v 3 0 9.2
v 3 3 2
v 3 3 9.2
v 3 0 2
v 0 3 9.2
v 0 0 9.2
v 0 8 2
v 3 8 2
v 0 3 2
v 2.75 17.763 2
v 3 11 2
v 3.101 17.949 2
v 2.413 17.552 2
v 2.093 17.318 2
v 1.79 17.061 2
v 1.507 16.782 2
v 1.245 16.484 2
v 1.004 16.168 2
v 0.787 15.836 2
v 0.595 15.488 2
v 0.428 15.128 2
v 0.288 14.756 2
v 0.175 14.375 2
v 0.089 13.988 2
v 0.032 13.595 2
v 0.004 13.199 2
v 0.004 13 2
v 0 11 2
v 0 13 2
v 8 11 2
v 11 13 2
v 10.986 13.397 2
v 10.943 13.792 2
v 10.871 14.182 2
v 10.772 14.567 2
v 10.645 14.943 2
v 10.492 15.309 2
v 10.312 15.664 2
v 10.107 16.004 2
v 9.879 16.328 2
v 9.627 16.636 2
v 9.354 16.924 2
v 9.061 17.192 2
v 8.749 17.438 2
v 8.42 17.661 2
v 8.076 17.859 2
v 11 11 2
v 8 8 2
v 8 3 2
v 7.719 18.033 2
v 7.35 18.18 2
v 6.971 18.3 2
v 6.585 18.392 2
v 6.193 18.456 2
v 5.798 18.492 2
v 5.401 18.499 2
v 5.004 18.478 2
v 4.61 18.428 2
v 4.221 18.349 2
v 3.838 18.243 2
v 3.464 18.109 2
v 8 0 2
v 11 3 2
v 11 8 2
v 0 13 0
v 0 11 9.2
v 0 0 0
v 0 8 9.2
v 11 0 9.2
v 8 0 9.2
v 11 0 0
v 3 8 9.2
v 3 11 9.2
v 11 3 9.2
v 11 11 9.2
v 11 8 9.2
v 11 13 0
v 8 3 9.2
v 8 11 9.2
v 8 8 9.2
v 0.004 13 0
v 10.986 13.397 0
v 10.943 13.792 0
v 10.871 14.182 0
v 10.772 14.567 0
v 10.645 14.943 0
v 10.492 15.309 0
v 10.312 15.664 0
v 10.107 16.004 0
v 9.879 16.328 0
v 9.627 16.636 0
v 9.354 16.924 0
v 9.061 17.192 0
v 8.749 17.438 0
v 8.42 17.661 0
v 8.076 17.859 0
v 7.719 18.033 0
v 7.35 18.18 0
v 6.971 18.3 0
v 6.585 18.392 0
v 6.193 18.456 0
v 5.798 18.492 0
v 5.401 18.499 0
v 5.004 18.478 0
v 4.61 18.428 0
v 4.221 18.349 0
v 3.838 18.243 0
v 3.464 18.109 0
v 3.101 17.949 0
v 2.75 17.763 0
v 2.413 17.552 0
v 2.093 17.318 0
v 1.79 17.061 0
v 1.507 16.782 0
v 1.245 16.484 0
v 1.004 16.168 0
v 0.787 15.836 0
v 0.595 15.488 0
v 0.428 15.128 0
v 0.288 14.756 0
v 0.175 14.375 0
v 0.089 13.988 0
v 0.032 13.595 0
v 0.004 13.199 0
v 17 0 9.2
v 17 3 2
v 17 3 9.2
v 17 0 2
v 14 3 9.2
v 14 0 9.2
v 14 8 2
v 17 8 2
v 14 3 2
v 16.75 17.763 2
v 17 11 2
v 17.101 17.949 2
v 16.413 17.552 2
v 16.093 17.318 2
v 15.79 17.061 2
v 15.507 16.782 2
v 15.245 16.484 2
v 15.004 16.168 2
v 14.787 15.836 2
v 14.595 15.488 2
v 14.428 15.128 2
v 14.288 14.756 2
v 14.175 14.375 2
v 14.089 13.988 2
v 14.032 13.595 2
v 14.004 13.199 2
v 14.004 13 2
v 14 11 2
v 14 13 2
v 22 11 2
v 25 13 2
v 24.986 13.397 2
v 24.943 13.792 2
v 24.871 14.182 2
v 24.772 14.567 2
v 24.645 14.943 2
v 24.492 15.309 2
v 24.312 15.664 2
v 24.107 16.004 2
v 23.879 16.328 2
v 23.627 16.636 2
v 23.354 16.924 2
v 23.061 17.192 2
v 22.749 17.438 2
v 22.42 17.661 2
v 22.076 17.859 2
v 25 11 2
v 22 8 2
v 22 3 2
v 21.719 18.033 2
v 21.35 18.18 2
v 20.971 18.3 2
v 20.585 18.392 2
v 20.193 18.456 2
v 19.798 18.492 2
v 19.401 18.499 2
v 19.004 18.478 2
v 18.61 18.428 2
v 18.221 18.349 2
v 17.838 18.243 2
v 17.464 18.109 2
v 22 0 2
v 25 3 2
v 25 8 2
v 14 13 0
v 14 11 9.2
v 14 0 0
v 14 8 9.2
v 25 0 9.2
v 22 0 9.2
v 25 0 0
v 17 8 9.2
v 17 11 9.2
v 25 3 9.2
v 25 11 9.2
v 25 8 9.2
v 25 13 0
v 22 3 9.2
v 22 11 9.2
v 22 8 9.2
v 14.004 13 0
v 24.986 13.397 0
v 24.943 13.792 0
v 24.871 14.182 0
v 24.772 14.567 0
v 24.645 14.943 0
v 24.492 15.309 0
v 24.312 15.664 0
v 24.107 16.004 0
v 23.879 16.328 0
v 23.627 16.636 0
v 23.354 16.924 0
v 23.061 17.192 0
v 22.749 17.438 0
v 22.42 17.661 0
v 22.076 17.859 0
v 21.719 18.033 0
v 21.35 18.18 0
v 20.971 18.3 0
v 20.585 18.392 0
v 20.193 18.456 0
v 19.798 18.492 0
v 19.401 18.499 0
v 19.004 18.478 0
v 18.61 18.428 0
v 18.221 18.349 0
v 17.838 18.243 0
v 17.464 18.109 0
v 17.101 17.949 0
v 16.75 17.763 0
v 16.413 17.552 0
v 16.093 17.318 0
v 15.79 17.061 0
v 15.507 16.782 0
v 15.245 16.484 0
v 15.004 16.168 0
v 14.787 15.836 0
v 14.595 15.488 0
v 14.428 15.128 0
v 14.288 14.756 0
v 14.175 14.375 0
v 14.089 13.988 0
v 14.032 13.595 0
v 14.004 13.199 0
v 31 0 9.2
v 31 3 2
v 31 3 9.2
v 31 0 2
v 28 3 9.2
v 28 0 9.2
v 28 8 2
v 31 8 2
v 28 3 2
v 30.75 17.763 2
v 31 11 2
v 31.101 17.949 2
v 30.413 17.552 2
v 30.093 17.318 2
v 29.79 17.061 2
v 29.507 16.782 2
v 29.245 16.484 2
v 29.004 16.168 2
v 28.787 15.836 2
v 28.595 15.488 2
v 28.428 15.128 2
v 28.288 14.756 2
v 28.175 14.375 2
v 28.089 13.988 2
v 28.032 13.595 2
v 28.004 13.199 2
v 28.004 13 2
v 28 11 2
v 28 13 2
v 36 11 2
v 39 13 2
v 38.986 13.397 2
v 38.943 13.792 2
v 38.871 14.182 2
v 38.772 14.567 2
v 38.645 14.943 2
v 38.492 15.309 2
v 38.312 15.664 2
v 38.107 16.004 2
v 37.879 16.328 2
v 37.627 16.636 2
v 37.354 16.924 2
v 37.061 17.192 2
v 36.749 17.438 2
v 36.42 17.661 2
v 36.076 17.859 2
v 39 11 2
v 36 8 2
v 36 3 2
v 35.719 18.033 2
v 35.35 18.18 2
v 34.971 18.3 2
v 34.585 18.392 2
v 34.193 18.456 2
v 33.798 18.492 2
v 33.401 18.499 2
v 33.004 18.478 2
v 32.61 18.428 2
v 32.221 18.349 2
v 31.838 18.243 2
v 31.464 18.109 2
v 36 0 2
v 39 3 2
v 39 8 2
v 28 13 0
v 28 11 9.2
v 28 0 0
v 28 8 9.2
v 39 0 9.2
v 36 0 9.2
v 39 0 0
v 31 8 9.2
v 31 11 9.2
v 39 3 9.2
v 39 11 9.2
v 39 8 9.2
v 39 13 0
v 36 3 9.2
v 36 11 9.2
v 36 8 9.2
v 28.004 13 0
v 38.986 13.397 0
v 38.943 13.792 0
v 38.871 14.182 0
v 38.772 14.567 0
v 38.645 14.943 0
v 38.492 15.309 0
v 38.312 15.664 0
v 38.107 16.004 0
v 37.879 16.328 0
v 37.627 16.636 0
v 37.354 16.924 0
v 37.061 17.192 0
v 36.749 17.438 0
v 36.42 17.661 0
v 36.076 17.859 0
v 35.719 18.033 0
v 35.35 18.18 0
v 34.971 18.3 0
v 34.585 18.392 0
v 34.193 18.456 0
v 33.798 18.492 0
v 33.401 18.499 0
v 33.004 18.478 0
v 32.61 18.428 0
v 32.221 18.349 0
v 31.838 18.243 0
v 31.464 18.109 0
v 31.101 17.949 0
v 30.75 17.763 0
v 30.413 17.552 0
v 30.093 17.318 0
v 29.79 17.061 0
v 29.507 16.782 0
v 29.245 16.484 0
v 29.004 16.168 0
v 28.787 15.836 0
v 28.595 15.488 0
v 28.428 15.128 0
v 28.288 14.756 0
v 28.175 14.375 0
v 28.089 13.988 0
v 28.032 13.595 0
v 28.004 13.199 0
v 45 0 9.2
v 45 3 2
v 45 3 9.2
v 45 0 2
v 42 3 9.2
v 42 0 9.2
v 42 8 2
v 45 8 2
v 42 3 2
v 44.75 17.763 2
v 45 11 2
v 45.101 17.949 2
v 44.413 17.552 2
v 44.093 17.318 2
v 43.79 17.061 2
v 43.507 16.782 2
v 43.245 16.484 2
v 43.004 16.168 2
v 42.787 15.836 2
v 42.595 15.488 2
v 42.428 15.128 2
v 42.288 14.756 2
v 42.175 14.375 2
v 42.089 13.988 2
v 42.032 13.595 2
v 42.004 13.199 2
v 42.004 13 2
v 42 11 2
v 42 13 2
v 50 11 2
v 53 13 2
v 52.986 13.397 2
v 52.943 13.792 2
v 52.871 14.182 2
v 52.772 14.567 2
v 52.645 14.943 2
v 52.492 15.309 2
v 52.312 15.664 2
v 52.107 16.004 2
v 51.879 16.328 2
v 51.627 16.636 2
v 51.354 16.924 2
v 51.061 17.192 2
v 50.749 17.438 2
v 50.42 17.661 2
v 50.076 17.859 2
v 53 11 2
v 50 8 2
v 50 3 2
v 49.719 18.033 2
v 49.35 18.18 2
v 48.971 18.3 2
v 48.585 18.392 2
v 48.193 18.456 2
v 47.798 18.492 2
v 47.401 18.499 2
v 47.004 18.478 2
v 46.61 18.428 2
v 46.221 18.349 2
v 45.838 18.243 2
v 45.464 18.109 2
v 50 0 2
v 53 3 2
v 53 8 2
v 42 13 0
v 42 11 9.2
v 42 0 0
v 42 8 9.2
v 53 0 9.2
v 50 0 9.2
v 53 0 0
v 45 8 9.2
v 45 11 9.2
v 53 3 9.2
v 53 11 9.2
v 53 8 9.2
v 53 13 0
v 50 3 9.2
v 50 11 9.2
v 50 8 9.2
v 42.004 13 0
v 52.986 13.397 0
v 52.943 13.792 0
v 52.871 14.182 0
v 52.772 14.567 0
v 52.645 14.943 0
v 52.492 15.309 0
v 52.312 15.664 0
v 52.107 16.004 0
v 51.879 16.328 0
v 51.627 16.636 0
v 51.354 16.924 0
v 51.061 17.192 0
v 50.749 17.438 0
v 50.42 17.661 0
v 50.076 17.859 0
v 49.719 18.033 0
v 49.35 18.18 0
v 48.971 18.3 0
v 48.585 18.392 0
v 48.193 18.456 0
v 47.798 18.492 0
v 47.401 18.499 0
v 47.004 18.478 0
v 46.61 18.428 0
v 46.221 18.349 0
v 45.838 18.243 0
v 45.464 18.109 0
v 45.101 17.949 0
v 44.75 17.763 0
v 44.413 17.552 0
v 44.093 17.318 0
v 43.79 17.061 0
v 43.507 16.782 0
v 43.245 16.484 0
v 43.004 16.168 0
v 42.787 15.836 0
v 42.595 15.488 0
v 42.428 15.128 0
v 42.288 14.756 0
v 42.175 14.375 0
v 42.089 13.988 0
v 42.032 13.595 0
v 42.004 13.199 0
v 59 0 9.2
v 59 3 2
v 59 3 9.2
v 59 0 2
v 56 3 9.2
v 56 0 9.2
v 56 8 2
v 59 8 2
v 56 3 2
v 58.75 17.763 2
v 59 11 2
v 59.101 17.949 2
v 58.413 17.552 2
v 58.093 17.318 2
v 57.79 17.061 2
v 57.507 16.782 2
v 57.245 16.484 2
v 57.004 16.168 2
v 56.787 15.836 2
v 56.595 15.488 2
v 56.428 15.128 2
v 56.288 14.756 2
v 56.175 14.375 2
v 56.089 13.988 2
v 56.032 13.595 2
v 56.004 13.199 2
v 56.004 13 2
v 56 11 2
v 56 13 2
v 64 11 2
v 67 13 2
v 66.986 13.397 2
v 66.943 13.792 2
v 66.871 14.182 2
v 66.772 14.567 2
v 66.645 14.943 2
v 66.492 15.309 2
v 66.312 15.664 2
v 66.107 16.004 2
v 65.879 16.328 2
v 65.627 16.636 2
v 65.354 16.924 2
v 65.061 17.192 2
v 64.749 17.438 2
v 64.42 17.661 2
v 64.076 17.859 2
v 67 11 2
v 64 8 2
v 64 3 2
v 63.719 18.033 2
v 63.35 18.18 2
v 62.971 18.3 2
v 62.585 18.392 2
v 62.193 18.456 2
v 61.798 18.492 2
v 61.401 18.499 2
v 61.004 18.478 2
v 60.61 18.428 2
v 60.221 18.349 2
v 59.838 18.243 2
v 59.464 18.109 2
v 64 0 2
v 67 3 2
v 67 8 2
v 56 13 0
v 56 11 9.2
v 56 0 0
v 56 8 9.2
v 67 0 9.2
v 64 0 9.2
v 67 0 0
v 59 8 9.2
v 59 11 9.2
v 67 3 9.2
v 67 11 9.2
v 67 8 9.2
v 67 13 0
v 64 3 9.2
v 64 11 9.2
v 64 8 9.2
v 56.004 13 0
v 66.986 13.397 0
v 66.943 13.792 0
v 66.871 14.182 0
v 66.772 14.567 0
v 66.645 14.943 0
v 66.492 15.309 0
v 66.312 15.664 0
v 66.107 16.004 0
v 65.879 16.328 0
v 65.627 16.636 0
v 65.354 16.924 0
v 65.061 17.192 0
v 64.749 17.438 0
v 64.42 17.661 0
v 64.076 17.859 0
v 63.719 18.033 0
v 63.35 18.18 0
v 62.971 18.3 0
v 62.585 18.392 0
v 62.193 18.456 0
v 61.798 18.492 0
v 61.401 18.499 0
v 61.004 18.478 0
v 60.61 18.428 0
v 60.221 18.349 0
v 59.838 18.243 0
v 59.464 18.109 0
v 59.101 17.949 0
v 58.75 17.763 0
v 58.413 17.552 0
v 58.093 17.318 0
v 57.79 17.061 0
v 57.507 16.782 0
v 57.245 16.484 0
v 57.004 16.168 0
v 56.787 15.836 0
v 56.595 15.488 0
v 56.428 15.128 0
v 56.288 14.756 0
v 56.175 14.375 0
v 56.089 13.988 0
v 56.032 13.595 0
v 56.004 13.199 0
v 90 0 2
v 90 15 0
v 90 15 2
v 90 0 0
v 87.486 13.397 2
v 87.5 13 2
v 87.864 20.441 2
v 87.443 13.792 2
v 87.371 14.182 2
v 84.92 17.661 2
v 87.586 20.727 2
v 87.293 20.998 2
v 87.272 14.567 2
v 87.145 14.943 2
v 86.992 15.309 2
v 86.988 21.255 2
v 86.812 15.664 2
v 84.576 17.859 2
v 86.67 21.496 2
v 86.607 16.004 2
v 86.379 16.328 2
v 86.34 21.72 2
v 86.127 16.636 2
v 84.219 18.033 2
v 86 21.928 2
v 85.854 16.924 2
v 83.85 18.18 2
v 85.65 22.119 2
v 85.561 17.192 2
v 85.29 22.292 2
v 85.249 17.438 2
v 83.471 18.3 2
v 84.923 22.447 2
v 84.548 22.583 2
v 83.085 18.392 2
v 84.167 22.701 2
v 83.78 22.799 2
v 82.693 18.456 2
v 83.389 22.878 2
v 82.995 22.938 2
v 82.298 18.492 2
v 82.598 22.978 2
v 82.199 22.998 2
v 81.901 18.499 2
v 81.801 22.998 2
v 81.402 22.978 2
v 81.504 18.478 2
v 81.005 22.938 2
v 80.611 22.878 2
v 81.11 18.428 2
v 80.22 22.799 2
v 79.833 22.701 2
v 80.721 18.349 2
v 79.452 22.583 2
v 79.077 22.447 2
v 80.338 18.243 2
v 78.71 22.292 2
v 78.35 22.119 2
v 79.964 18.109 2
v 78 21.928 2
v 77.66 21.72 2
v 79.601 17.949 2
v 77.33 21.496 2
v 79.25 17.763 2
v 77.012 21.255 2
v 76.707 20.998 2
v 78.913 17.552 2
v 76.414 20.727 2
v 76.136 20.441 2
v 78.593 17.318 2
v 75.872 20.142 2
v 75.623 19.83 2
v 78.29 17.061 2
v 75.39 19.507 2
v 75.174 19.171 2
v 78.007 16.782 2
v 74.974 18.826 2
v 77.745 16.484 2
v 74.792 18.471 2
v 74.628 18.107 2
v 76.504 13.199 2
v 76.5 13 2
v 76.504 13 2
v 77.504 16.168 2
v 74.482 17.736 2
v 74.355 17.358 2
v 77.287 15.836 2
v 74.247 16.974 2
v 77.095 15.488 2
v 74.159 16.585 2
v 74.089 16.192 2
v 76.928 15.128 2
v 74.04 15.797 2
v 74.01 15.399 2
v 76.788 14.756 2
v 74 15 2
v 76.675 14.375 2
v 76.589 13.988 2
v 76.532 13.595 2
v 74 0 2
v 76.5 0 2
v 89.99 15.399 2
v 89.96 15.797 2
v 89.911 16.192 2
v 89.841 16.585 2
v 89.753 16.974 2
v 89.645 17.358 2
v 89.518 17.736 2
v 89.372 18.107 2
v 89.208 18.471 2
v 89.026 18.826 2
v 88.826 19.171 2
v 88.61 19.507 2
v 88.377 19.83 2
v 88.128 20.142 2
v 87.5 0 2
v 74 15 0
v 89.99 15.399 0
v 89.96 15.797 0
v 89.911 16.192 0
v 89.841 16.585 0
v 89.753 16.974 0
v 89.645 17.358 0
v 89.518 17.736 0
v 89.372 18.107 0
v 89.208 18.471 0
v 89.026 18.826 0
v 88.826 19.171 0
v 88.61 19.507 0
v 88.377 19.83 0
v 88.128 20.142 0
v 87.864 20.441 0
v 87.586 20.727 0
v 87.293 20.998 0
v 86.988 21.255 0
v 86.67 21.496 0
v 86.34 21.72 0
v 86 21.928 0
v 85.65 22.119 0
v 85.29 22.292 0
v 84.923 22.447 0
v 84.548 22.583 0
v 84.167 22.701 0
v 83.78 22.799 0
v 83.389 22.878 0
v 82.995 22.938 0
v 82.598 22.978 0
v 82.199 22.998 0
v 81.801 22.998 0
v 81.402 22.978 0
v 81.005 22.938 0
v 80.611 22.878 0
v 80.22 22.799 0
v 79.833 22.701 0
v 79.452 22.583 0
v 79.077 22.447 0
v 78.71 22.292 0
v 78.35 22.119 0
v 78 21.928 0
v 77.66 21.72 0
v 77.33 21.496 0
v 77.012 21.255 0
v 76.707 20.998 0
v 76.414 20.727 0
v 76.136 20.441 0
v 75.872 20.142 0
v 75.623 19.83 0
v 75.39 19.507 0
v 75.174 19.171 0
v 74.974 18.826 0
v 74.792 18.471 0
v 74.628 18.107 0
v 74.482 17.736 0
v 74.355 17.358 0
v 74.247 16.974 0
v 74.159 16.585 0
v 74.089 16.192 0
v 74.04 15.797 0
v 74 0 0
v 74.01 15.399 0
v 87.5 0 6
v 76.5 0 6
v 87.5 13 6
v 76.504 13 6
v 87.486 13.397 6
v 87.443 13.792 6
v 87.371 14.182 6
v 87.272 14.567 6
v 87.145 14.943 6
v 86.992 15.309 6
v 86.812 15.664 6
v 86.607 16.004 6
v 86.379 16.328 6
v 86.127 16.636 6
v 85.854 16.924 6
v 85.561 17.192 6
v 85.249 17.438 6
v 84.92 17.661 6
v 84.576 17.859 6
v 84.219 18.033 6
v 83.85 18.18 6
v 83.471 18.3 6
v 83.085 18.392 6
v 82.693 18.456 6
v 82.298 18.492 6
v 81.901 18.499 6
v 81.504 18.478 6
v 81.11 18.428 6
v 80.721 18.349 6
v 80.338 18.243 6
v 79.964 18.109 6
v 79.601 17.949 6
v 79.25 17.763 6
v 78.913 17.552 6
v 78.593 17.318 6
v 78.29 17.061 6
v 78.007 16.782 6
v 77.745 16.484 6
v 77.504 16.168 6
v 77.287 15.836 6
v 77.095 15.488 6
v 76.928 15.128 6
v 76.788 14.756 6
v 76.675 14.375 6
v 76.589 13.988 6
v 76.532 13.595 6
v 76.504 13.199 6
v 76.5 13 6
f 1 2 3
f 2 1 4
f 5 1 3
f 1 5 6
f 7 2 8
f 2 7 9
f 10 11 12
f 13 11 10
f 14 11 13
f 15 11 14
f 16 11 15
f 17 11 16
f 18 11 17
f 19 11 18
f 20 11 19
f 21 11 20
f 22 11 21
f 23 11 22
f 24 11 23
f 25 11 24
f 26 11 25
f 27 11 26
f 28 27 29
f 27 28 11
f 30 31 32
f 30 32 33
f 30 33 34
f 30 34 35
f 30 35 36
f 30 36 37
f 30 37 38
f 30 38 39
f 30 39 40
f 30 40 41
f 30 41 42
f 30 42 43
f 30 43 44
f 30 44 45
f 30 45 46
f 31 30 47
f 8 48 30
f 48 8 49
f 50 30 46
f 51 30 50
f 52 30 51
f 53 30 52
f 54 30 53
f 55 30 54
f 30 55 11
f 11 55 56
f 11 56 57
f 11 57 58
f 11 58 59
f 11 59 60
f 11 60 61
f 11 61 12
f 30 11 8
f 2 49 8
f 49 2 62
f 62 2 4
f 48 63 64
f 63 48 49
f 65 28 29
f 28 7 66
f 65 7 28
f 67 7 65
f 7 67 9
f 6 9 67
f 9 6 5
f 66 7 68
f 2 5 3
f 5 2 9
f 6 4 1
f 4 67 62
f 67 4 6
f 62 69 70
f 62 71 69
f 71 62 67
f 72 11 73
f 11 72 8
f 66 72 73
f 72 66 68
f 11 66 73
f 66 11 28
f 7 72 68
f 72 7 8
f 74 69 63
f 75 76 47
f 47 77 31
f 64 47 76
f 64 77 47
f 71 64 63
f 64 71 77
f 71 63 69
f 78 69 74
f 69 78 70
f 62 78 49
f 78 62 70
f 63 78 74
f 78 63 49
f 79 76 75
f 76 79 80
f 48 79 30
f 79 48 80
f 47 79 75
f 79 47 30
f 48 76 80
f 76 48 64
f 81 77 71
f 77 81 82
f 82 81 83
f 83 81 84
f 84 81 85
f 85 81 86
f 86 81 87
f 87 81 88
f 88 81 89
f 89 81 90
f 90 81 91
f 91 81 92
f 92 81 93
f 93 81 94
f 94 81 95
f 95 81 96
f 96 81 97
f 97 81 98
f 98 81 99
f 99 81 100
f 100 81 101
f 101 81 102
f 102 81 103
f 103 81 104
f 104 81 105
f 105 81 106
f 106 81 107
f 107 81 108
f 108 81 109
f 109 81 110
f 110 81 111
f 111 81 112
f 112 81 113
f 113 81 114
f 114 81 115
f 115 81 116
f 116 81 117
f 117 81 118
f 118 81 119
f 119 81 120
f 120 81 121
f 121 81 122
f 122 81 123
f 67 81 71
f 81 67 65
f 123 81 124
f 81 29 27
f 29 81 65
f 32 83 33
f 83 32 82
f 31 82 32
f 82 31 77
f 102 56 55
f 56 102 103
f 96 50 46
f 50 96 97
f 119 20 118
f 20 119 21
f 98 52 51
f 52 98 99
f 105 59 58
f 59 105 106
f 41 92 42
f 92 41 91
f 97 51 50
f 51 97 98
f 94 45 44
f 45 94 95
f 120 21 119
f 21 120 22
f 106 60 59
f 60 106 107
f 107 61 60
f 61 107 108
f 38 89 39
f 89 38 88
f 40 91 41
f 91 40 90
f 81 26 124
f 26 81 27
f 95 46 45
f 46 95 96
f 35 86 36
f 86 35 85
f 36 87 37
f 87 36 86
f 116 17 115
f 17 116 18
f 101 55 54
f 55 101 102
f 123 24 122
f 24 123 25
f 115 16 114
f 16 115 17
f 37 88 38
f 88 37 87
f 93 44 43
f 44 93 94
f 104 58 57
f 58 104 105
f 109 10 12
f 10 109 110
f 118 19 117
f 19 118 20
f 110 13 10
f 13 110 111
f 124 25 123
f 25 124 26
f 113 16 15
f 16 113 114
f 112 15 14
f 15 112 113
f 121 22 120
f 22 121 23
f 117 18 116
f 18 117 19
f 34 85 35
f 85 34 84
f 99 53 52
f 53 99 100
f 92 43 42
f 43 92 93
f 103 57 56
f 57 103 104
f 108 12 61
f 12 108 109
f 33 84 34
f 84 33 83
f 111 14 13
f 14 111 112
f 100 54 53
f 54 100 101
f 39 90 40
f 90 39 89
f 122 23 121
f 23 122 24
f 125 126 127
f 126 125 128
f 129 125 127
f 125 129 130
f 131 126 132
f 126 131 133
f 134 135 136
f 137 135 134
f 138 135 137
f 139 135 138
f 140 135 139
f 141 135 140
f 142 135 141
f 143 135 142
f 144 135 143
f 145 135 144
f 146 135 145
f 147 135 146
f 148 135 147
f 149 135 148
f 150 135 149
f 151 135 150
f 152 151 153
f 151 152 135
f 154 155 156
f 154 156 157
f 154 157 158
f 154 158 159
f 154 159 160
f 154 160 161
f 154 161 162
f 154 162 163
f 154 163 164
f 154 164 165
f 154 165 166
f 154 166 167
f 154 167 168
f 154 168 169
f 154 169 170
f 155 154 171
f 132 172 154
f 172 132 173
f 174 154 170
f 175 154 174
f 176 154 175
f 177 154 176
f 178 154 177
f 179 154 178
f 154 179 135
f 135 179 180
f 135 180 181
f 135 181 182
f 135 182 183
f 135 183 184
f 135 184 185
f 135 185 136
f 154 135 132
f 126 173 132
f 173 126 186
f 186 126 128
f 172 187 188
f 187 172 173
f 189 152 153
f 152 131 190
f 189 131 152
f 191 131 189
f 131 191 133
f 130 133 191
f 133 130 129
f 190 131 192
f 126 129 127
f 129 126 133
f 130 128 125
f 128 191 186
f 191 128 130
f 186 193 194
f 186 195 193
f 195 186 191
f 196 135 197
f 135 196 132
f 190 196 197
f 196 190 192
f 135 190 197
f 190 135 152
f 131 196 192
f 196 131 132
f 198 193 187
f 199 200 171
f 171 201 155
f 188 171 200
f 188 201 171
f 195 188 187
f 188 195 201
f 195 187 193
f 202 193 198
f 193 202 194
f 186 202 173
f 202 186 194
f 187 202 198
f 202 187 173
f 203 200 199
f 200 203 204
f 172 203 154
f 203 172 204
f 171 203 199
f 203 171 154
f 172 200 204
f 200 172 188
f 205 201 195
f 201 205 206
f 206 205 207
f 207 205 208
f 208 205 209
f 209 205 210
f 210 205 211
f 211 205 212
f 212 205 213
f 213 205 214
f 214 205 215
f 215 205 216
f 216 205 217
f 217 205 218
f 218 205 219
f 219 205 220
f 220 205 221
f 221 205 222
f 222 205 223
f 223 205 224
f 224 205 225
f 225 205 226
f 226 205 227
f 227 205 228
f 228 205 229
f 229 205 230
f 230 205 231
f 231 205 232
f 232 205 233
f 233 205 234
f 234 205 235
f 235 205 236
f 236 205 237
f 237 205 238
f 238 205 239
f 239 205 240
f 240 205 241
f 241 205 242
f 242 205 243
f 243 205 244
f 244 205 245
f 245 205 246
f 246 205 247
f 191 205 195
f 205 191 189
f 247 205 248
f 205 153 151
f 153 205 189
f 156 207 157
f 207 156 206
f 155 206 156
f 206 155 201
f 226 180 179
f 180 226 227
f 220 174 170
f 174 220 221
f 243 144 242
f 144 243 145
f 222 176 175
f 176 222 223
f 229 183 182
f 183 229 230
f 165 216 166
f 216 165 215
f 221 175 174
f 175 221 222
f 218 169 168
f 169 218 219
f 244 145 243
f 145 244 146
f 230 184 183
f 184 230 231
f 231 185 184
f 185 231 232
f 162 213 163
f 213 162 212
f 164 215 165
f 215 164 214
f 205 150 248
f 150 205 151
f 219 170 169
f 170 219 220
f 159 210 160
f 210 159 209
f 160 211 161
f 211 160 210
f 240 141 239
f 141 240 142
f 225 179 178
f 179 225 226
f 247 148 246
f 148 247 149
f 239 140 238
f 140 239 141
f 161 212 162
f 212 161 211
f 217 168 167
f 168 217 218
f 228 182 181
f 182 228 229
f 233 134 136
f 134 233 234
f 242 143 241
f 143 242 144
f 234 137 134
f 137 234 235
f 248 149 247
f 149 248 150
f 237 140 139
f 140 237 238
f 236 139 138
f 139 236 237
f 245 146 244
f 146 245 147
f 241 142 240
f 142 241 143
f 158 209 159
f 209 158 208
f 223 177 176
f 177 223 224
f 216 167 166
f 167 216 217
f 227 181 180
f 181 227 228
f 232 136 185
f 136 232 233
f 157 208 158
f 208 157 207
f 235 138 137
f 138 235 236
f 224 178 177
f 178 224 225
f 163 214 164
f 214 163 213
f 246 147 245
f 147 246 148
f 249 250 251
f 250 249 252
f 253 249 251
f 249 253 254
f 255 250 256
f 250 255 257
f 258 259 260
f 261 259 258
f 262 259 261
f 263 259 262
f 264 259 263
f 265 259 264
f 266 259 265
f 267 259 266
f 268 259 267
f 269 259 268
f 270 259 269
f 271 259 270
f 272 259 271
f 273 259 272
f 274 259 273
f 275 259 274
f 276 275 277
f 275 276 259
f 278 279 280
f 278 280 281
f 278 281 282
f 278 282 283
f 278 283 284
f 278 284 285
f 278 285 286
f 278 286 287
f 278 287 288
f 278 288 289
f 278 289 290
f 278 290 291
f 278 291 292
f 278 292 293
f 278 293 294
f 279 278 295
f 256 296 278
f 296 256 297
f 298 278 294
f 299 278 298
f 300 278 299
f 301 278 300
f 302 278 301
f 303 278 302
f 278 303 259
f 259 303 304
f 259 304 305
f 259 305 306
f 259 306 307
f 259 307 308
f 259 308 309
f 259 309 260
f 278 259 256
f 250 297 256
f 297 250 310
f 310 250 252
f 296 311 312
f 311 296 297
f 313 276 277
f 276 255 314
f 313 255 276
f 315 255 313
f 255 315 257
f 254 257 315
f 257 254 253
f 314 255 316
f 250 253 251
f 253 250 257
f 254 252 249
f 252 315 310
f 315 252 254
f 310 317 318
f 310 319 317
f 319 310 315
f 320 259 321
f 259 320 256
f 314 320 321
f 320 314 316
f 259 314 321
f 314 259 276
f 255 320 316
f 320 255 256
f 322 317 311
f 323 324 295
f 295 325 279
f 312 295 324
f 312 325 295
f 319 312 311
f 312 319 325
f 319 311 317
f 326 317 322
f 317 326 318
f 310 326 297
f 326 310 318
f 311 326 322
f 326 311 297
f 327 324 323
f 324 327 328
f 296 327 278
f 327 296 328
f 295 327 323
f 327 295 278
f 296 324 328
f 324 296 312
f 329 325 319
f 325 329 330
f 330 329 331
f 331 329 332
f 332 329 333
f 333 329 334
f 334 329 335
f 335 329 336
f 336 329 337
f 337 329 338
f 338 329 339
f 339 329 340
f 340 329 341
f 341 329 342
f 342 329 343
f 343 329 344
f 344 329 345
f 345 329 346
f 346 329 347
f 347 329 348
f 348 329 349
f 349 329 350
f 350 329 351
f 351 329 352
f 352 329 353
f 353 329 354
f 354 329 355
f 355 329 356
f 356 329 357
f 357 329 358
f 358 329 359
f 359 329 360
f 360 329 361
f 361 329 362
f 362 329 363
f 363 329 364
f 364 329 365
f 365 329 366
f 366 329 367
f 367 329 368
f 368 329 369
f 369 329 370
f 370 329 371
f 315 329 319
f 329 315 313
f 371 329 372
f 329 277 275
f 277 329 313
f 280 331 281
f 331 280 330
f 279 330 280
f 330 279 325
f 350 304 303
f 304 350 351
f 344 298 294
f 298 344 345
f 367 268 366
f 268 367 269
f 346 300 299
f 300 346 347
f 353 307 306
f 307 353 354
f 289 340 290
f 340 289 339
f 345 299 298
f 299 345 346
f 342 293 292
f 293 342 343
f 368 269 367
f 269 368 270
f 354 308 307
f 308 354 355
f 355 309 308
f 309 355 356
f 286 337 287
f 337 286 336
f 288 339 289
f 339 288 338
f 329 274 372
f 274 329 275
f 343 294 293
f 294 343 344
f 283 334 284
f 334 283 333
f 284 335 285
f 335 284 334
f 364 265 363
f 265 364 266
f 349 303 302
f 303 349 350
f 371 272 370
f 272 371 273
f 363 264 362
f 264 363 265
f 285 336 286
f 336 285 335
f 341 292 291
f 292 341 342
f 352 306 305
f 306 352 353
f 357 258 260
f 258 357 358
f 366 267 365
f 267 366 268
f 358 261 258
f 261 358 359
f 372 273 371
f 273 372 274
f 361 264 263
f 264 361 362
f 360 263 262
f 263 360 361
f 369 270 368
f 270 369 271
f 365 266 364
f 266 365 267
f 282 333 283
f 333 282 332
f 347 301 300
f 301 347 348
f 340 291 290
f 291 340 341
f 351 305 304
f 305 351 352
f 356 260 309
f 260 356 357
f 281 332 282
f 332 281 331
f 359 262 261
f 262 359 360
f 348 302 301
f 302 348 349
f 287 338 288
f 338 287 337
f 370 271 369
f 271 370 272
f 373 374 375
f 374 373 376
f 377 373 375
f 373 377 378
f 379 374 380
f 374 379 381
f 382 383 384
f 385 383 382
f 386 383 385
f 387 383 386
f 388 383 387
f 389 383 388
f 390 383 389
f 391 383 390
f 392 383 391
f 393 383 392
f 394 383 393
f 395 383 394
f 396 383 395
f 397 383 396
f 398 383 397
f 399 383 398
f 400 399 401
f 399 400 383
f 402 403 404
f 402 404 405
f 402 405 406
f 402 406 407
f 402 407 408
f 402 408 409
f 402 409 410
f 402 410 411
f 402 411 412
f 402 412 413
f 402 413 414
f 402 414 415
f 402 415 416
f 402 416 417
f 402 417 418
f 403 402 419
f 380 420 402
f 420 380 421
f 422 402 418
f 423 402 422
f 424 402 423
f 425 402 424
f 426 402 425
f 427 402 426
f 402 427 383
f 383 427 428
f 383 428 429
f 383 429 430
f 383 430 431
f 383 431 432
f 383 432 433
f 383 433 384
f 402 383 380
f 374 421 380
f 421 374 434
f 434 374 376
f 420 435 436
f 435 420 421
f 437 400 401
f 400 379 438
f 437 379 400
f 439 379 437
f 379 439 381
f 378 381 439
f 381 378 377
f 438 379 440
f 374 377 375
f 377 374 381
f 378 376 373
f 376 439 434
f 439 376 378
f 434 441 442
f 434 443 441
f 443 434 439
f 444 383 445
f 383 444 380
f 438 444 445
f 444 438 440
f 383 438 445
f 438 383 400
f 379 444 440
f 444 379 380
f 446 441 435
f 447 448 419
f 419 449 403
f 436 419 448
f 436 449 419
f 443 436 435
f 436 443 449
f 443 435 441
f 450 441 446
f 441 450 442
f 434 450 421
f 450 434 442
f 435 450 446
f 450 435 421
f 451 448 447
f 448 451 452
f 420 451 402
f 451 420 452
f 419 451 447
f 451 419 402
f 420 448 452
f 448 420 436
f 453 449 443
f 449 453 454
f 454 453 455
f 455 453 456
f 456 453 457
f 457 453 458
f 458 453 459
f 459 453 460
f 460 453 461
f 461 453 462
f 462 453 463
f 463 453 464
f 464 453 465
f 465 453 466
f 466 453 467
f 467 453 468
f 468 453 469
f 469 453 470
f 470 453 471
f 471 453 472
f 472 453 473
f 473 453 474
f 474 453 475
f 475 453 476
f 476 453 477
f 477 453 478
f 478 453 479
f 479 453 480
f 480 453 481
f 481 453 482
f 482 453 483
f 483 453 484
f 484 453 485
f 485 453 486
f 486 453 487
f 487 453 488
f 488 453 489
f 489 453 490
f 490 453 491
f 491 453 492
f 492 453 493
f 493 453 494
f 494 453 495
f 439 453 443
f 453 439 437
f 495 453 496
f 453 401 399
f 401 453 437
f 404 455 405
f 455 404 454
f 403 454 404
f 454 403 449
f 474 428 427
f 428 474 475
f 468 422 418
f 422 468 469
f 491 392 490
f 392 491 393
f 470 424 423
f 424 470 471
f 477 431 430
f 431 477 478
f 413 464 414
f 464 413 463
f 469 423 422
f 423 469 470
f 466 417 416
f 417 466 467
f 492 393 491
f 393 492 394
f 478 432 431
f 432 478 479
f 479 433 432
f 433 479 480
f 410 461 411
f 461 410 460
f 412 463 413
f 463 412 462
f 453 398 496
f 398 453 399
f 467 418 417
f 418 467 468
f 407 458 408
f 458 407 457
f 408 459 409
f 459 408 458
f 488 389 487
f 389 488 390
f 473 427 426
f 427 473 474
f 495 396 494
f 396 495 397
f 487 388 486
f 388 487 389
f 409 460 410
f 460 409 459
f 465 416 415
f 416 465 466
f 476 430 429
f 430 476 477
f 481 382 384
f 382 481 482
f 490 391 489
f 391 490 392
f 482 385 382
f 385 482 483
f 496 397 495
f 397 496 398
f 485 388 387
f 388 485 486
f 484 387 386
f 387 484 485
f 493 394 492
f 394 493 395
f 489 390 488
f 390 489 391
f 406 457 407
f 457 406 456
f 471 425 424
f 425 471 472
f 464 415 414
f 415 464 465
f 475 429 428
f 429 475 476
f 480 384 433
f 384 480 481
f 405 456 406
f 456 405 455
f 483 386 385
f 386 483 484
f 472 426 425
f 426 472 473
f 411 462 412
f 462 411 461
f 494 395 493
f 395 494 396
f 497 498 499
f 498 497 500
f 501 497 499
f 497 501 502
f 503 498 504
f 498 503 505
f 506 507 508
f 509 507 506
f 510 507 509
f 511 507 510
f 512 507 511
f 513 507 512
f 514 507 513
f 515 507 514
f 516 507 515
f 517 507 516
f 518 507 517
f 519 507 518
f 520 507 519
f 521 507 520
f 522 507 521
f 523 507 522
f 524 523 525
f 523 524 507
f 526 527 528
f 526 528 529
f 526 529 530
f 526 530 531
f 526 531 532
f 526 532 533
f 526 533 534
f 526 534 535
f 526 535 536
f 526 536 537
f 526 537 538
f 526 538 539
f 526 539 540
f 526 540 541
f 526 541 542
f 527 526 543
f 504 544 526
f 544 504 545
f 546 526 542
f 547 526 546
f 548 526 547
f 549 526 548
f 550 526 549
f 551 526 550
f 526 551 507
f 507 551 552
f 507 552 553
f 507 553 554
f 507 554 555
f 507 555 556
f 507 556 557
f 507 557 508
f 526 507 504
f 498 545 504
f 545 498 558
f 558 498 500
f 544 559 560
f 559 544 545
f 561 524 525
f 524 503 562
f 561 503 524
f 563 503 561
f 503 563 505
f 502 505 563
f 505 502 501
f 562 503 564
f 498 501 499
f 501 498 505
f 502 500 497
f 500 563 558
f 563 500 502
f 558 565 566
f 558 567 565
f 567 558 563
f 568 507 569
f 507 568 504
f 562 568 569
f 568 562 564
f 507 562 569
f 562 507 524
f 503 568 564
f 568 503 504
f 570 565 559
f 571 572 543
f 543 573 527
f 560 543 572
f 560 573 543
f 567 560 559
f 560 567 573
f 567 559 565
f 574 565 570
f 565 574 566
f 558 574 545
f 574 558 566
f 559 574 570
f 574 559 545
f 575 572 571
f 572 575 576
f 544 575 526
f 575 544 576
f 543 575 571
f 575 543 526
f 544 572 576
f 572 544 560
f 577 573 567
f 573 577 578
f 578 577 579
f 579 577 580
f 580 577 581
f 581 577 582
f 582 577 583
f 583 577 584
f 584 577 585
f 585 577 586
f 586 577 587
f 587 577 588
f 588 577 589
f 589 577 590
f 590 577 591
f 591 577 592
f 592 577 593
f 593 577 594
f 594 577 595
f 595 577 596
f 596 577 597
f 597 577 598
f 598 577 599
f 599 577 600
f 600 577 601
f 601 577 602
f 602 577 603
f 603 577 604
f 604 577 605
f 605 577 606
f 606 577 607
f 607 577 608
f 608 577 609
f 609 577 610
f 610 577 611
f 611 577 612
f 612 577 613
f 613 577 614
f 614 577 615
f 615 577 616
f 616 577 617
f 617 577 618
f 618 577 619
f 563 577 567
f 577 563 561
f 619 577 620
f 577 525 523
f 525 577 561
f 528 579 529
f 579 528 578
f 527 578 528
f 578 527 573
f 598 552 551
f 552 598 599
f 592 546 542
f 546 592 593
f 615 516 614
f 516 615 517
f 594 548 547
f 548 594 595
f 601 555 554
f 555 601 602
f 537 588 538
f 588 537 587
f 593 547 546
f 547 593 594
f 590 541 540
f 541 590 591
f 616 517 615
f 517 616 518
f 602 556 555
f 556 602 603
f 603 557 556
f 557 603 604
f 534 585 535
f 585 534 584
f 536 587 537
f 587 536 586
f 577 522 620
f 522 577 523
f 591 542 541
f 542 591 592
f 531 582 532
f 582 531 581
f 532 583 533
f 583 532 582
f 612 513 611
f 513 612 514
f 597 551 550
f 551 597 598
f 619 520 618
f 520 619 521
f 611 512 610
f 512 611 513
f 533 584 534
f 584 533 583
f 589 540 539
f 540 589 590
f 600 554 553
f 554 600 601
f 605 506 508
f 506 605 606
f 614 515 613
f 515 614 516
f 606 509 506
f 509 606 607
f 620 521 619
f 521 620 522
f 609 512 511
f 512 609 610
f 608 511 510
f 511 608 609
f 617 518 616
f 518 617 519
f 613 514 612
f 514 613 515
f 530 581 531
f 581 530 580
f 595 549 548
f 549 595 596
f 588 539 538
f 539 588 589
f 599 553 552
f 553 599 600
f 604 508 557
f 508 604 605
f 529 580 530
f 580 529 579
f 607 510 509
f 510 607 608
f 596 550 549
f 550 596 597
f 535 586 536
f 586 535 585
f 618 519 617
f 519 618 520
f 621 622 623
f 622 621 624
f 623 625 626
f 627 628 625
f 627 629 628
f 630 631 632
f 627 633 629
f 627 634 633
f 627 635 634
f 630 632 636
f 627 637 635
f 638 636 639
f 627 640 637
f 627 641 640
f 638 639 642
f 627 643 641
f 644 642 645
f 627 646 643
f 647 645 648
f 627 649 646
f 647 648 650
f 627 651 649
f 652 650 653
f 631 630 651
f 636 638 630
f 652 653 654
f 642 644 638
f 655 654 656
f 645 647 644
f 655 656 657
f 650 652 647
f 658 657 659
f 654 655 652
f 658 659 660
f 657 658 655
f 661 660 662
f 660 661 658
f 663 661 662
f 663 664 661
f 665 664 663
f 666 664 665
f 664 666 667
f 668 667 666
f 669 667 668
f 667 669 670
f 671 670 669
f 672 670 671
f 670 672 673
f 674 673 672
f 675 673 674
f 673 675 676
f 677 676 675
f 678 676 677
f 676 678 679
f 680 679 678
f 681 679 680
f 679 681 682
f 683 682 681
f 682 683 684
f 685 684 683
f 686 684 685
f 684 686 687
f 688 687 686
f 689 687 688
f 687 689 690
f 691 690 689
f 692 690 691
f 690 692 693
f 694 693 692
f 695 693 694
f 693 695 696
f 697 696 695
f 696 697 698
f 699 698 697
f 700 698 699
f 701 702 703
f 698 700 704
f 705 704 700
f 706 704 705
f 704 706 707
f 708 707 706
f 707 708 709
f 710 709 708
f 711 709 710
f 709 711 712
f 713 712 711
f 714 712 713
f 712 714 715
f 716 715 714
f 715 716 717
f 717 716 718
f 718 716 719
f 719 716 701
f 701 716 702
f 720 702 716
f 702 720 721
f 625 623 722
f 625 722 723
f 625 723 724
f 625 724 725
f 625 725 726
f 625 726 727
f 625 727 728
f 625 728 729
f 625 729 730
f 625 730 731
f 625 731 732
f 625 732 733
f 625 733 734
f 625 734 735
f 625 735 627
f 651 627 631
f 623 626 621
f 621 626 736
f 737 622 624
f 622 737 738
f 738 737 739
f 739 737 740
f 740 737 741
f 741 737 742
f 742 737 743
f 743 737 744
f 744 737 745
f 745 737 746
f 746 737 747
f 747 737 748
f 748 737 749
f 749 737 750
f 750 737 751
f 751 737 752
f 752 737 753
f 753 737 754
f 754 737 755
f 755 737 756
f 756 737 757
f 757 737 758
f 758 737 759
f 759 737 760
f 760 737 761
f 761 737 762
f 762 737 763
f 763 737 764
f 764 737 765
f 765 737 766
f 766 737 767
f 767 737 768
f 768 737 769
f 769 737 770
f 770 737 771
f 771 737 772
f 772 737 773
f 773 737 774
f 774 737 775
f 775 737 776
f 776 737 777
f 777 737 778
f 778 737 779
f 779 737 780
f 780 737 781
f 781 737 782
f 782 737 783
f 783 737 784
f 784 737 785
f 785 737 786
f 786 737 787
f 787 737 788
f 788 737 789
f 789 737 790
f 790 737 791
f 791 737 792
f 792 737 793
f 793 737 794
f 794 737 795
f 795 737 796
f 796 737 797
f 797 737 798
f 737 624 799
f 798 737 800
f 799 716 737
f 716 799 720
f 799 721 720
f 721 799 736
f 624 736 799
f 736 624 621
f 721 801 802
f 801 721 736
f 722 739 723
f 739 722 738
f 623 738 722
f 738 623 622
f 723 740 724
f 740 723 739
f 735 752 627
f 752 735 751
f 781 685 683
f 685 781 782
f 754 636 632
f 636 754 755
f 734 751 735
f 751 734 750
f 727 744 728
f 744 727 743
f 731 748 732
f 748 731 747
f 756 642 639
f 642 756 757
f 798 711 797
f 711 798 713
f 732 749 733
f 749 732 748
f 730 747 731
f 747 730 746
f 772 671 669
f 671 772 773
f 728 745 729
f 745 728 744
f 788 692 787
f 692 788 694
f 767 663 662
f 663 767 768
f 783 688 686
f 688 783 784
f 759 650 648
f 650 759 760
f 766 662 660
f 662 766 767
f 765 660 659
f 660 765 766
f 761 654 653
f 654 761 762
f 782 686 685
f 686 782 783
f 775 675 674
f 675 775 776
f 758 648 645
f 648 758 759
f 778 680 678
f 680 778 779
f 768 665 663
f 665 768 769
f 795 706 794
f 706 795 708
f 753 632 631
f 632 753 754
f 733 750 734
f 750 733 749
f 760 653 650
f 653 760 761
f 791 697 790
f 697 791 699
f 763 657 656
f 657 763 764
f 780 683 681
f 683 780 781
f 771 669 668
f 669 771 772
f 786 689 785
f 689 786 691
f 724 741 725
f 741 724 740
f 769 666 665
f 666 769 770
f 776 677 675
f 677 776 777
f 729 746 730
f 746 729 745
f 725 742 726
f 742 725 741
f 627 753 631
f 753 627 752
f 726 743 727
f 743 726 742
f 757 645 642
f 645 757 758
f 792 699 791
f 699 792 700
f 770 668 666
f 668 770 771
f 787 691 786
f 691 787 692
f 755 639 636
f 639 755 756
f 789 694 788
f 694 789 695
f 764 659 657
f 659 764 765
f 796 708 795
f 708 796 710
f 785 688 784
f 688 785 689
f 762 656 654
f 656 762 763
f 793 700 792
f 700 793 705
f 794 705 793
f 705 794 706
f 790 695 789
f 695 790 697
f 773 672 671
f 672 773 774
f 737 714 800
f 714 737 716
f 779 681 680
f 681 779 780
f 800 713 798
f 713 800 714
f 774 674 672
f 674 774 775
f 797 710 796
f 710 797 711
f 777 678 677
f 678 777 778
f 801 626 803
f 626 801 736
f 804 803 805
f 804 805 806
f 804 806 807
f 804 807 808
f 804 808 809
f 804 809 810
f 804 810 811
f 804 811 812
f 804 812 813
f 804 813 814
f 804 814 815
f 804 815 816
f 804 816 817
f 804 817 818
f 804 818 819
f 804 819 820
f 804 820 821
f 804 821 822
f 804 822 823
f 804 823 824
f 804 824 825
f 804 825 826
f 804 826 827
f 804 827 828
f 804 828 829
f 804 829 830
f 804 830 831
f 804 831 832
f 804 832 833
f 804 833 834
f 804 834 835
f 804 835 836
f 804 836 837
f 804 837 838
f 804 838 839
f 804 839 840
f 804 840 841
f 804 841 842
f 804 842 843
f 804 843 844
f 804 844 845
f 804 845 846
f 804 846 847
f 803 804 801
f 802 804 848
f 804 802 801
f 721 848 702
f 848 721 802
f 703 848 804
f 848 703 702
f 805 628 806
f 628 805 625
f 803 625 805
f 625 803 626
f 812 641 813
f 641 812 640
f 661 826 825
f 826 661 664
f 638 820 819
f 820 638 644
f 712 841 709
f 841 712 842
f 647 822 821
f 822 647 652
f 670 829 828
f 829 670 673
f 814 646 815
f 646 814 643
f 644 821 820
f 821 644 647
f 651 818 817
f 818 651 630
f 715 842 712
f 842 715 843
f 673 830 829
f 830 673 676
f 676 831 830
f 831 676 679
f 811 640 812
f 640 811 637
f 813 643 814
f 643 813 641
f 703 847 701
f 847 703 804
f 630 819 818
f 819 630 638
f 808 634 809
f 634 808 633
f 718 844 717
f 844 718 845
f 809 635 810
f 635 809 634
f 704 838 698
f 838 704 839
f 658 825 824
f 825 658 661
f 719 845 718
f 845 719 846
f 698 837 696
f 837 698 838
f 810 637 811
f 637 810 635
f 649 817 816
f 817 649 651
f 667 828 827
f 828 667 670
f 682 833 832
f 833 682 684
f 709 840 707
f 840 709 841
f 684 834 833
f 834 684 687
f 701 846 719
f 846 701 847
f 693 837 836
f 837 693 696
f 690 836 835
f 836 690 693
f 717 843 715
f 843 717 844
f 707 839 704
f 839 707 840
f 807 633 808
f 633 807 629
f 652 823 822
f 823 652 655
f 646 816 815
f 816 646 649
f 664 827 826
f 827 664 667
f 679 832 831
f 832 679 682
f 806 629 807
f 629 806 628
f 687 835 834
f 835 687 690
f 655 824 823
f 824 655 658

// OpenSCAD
//CONFIG
fret_clearance_depth = 4; //Depth required at the back of the fret. Unit = (mm).

generate_setting_tool = true; // Enable the generation of the setting tool. The setting tool is used to ensure you have removed enough material from the fret and the spacer is seated to your specified "fret_clearance_depth". If the setting tool does not bottom out on the back of the fret, more material needs to be removed. . Unit = (true/false).

//ADVANCED CONFIG
fret_depth = 13.2; //Internal depth  of thr fret. The x and y dimentions of standard GH frets differs slightly between models however z appears to consistant. Measure the internal depth of your frets for acuracy. Unit = (mm).

platform_thickness = 2;

//WHERE THE MAGIC HAPPENS

$fa = 1;
$fs = 0.4;
spacer_w = 11;
spacer_l = 13;
leg_w = 3;
leg_l = 3;

for (dx=[0:14:69]) { //PLATE BUILDER
    translate([dx,0,0]) fret_spacer();
        if (dx == 56 && generate_setting_tool){
            translate([dx + 18,0,0])setting_tool();
        }
}
module fret_spacer() { //SPACER GENERATOR
    for (xcor=[0:spacer_w-leg_w:2*(spacer_w-leg_w)-1])
        {
            for (ycor=[0:spacer_w-leg_l:(spacer_l-leg_l)-1])
                {
                    translate([xcor,ycor,platform_thickness])
                    leg();
        }
    }
        cube([spacer_w, spacer_l, platform_thickness]);
    translate([spacer_w/2,spacer_l,0]) cylinder(platform_thickness, spacer_w/2, spacer_w/2);
}

module leg(){
    leg_height = fret_depth -(fret_clearance_depth + platform_thickness);
    cube([leg_w, leg_l, leg_height]);
}

module setting_tool() { //SETTING TOOL GENERATOR
    cube([16, 15, 2]);
    translate([8,15]) cylinder(2, 8, 8);
    translate([2.5,0,2]) cube([spacer_w, spacer_l, fret_clearance_depth]);
    translate([(spacer_w/2)+2.5,spacer_l,2]) cylinder(fret_clearance_depth, spacer_w/2, spacer_w/2);
}
